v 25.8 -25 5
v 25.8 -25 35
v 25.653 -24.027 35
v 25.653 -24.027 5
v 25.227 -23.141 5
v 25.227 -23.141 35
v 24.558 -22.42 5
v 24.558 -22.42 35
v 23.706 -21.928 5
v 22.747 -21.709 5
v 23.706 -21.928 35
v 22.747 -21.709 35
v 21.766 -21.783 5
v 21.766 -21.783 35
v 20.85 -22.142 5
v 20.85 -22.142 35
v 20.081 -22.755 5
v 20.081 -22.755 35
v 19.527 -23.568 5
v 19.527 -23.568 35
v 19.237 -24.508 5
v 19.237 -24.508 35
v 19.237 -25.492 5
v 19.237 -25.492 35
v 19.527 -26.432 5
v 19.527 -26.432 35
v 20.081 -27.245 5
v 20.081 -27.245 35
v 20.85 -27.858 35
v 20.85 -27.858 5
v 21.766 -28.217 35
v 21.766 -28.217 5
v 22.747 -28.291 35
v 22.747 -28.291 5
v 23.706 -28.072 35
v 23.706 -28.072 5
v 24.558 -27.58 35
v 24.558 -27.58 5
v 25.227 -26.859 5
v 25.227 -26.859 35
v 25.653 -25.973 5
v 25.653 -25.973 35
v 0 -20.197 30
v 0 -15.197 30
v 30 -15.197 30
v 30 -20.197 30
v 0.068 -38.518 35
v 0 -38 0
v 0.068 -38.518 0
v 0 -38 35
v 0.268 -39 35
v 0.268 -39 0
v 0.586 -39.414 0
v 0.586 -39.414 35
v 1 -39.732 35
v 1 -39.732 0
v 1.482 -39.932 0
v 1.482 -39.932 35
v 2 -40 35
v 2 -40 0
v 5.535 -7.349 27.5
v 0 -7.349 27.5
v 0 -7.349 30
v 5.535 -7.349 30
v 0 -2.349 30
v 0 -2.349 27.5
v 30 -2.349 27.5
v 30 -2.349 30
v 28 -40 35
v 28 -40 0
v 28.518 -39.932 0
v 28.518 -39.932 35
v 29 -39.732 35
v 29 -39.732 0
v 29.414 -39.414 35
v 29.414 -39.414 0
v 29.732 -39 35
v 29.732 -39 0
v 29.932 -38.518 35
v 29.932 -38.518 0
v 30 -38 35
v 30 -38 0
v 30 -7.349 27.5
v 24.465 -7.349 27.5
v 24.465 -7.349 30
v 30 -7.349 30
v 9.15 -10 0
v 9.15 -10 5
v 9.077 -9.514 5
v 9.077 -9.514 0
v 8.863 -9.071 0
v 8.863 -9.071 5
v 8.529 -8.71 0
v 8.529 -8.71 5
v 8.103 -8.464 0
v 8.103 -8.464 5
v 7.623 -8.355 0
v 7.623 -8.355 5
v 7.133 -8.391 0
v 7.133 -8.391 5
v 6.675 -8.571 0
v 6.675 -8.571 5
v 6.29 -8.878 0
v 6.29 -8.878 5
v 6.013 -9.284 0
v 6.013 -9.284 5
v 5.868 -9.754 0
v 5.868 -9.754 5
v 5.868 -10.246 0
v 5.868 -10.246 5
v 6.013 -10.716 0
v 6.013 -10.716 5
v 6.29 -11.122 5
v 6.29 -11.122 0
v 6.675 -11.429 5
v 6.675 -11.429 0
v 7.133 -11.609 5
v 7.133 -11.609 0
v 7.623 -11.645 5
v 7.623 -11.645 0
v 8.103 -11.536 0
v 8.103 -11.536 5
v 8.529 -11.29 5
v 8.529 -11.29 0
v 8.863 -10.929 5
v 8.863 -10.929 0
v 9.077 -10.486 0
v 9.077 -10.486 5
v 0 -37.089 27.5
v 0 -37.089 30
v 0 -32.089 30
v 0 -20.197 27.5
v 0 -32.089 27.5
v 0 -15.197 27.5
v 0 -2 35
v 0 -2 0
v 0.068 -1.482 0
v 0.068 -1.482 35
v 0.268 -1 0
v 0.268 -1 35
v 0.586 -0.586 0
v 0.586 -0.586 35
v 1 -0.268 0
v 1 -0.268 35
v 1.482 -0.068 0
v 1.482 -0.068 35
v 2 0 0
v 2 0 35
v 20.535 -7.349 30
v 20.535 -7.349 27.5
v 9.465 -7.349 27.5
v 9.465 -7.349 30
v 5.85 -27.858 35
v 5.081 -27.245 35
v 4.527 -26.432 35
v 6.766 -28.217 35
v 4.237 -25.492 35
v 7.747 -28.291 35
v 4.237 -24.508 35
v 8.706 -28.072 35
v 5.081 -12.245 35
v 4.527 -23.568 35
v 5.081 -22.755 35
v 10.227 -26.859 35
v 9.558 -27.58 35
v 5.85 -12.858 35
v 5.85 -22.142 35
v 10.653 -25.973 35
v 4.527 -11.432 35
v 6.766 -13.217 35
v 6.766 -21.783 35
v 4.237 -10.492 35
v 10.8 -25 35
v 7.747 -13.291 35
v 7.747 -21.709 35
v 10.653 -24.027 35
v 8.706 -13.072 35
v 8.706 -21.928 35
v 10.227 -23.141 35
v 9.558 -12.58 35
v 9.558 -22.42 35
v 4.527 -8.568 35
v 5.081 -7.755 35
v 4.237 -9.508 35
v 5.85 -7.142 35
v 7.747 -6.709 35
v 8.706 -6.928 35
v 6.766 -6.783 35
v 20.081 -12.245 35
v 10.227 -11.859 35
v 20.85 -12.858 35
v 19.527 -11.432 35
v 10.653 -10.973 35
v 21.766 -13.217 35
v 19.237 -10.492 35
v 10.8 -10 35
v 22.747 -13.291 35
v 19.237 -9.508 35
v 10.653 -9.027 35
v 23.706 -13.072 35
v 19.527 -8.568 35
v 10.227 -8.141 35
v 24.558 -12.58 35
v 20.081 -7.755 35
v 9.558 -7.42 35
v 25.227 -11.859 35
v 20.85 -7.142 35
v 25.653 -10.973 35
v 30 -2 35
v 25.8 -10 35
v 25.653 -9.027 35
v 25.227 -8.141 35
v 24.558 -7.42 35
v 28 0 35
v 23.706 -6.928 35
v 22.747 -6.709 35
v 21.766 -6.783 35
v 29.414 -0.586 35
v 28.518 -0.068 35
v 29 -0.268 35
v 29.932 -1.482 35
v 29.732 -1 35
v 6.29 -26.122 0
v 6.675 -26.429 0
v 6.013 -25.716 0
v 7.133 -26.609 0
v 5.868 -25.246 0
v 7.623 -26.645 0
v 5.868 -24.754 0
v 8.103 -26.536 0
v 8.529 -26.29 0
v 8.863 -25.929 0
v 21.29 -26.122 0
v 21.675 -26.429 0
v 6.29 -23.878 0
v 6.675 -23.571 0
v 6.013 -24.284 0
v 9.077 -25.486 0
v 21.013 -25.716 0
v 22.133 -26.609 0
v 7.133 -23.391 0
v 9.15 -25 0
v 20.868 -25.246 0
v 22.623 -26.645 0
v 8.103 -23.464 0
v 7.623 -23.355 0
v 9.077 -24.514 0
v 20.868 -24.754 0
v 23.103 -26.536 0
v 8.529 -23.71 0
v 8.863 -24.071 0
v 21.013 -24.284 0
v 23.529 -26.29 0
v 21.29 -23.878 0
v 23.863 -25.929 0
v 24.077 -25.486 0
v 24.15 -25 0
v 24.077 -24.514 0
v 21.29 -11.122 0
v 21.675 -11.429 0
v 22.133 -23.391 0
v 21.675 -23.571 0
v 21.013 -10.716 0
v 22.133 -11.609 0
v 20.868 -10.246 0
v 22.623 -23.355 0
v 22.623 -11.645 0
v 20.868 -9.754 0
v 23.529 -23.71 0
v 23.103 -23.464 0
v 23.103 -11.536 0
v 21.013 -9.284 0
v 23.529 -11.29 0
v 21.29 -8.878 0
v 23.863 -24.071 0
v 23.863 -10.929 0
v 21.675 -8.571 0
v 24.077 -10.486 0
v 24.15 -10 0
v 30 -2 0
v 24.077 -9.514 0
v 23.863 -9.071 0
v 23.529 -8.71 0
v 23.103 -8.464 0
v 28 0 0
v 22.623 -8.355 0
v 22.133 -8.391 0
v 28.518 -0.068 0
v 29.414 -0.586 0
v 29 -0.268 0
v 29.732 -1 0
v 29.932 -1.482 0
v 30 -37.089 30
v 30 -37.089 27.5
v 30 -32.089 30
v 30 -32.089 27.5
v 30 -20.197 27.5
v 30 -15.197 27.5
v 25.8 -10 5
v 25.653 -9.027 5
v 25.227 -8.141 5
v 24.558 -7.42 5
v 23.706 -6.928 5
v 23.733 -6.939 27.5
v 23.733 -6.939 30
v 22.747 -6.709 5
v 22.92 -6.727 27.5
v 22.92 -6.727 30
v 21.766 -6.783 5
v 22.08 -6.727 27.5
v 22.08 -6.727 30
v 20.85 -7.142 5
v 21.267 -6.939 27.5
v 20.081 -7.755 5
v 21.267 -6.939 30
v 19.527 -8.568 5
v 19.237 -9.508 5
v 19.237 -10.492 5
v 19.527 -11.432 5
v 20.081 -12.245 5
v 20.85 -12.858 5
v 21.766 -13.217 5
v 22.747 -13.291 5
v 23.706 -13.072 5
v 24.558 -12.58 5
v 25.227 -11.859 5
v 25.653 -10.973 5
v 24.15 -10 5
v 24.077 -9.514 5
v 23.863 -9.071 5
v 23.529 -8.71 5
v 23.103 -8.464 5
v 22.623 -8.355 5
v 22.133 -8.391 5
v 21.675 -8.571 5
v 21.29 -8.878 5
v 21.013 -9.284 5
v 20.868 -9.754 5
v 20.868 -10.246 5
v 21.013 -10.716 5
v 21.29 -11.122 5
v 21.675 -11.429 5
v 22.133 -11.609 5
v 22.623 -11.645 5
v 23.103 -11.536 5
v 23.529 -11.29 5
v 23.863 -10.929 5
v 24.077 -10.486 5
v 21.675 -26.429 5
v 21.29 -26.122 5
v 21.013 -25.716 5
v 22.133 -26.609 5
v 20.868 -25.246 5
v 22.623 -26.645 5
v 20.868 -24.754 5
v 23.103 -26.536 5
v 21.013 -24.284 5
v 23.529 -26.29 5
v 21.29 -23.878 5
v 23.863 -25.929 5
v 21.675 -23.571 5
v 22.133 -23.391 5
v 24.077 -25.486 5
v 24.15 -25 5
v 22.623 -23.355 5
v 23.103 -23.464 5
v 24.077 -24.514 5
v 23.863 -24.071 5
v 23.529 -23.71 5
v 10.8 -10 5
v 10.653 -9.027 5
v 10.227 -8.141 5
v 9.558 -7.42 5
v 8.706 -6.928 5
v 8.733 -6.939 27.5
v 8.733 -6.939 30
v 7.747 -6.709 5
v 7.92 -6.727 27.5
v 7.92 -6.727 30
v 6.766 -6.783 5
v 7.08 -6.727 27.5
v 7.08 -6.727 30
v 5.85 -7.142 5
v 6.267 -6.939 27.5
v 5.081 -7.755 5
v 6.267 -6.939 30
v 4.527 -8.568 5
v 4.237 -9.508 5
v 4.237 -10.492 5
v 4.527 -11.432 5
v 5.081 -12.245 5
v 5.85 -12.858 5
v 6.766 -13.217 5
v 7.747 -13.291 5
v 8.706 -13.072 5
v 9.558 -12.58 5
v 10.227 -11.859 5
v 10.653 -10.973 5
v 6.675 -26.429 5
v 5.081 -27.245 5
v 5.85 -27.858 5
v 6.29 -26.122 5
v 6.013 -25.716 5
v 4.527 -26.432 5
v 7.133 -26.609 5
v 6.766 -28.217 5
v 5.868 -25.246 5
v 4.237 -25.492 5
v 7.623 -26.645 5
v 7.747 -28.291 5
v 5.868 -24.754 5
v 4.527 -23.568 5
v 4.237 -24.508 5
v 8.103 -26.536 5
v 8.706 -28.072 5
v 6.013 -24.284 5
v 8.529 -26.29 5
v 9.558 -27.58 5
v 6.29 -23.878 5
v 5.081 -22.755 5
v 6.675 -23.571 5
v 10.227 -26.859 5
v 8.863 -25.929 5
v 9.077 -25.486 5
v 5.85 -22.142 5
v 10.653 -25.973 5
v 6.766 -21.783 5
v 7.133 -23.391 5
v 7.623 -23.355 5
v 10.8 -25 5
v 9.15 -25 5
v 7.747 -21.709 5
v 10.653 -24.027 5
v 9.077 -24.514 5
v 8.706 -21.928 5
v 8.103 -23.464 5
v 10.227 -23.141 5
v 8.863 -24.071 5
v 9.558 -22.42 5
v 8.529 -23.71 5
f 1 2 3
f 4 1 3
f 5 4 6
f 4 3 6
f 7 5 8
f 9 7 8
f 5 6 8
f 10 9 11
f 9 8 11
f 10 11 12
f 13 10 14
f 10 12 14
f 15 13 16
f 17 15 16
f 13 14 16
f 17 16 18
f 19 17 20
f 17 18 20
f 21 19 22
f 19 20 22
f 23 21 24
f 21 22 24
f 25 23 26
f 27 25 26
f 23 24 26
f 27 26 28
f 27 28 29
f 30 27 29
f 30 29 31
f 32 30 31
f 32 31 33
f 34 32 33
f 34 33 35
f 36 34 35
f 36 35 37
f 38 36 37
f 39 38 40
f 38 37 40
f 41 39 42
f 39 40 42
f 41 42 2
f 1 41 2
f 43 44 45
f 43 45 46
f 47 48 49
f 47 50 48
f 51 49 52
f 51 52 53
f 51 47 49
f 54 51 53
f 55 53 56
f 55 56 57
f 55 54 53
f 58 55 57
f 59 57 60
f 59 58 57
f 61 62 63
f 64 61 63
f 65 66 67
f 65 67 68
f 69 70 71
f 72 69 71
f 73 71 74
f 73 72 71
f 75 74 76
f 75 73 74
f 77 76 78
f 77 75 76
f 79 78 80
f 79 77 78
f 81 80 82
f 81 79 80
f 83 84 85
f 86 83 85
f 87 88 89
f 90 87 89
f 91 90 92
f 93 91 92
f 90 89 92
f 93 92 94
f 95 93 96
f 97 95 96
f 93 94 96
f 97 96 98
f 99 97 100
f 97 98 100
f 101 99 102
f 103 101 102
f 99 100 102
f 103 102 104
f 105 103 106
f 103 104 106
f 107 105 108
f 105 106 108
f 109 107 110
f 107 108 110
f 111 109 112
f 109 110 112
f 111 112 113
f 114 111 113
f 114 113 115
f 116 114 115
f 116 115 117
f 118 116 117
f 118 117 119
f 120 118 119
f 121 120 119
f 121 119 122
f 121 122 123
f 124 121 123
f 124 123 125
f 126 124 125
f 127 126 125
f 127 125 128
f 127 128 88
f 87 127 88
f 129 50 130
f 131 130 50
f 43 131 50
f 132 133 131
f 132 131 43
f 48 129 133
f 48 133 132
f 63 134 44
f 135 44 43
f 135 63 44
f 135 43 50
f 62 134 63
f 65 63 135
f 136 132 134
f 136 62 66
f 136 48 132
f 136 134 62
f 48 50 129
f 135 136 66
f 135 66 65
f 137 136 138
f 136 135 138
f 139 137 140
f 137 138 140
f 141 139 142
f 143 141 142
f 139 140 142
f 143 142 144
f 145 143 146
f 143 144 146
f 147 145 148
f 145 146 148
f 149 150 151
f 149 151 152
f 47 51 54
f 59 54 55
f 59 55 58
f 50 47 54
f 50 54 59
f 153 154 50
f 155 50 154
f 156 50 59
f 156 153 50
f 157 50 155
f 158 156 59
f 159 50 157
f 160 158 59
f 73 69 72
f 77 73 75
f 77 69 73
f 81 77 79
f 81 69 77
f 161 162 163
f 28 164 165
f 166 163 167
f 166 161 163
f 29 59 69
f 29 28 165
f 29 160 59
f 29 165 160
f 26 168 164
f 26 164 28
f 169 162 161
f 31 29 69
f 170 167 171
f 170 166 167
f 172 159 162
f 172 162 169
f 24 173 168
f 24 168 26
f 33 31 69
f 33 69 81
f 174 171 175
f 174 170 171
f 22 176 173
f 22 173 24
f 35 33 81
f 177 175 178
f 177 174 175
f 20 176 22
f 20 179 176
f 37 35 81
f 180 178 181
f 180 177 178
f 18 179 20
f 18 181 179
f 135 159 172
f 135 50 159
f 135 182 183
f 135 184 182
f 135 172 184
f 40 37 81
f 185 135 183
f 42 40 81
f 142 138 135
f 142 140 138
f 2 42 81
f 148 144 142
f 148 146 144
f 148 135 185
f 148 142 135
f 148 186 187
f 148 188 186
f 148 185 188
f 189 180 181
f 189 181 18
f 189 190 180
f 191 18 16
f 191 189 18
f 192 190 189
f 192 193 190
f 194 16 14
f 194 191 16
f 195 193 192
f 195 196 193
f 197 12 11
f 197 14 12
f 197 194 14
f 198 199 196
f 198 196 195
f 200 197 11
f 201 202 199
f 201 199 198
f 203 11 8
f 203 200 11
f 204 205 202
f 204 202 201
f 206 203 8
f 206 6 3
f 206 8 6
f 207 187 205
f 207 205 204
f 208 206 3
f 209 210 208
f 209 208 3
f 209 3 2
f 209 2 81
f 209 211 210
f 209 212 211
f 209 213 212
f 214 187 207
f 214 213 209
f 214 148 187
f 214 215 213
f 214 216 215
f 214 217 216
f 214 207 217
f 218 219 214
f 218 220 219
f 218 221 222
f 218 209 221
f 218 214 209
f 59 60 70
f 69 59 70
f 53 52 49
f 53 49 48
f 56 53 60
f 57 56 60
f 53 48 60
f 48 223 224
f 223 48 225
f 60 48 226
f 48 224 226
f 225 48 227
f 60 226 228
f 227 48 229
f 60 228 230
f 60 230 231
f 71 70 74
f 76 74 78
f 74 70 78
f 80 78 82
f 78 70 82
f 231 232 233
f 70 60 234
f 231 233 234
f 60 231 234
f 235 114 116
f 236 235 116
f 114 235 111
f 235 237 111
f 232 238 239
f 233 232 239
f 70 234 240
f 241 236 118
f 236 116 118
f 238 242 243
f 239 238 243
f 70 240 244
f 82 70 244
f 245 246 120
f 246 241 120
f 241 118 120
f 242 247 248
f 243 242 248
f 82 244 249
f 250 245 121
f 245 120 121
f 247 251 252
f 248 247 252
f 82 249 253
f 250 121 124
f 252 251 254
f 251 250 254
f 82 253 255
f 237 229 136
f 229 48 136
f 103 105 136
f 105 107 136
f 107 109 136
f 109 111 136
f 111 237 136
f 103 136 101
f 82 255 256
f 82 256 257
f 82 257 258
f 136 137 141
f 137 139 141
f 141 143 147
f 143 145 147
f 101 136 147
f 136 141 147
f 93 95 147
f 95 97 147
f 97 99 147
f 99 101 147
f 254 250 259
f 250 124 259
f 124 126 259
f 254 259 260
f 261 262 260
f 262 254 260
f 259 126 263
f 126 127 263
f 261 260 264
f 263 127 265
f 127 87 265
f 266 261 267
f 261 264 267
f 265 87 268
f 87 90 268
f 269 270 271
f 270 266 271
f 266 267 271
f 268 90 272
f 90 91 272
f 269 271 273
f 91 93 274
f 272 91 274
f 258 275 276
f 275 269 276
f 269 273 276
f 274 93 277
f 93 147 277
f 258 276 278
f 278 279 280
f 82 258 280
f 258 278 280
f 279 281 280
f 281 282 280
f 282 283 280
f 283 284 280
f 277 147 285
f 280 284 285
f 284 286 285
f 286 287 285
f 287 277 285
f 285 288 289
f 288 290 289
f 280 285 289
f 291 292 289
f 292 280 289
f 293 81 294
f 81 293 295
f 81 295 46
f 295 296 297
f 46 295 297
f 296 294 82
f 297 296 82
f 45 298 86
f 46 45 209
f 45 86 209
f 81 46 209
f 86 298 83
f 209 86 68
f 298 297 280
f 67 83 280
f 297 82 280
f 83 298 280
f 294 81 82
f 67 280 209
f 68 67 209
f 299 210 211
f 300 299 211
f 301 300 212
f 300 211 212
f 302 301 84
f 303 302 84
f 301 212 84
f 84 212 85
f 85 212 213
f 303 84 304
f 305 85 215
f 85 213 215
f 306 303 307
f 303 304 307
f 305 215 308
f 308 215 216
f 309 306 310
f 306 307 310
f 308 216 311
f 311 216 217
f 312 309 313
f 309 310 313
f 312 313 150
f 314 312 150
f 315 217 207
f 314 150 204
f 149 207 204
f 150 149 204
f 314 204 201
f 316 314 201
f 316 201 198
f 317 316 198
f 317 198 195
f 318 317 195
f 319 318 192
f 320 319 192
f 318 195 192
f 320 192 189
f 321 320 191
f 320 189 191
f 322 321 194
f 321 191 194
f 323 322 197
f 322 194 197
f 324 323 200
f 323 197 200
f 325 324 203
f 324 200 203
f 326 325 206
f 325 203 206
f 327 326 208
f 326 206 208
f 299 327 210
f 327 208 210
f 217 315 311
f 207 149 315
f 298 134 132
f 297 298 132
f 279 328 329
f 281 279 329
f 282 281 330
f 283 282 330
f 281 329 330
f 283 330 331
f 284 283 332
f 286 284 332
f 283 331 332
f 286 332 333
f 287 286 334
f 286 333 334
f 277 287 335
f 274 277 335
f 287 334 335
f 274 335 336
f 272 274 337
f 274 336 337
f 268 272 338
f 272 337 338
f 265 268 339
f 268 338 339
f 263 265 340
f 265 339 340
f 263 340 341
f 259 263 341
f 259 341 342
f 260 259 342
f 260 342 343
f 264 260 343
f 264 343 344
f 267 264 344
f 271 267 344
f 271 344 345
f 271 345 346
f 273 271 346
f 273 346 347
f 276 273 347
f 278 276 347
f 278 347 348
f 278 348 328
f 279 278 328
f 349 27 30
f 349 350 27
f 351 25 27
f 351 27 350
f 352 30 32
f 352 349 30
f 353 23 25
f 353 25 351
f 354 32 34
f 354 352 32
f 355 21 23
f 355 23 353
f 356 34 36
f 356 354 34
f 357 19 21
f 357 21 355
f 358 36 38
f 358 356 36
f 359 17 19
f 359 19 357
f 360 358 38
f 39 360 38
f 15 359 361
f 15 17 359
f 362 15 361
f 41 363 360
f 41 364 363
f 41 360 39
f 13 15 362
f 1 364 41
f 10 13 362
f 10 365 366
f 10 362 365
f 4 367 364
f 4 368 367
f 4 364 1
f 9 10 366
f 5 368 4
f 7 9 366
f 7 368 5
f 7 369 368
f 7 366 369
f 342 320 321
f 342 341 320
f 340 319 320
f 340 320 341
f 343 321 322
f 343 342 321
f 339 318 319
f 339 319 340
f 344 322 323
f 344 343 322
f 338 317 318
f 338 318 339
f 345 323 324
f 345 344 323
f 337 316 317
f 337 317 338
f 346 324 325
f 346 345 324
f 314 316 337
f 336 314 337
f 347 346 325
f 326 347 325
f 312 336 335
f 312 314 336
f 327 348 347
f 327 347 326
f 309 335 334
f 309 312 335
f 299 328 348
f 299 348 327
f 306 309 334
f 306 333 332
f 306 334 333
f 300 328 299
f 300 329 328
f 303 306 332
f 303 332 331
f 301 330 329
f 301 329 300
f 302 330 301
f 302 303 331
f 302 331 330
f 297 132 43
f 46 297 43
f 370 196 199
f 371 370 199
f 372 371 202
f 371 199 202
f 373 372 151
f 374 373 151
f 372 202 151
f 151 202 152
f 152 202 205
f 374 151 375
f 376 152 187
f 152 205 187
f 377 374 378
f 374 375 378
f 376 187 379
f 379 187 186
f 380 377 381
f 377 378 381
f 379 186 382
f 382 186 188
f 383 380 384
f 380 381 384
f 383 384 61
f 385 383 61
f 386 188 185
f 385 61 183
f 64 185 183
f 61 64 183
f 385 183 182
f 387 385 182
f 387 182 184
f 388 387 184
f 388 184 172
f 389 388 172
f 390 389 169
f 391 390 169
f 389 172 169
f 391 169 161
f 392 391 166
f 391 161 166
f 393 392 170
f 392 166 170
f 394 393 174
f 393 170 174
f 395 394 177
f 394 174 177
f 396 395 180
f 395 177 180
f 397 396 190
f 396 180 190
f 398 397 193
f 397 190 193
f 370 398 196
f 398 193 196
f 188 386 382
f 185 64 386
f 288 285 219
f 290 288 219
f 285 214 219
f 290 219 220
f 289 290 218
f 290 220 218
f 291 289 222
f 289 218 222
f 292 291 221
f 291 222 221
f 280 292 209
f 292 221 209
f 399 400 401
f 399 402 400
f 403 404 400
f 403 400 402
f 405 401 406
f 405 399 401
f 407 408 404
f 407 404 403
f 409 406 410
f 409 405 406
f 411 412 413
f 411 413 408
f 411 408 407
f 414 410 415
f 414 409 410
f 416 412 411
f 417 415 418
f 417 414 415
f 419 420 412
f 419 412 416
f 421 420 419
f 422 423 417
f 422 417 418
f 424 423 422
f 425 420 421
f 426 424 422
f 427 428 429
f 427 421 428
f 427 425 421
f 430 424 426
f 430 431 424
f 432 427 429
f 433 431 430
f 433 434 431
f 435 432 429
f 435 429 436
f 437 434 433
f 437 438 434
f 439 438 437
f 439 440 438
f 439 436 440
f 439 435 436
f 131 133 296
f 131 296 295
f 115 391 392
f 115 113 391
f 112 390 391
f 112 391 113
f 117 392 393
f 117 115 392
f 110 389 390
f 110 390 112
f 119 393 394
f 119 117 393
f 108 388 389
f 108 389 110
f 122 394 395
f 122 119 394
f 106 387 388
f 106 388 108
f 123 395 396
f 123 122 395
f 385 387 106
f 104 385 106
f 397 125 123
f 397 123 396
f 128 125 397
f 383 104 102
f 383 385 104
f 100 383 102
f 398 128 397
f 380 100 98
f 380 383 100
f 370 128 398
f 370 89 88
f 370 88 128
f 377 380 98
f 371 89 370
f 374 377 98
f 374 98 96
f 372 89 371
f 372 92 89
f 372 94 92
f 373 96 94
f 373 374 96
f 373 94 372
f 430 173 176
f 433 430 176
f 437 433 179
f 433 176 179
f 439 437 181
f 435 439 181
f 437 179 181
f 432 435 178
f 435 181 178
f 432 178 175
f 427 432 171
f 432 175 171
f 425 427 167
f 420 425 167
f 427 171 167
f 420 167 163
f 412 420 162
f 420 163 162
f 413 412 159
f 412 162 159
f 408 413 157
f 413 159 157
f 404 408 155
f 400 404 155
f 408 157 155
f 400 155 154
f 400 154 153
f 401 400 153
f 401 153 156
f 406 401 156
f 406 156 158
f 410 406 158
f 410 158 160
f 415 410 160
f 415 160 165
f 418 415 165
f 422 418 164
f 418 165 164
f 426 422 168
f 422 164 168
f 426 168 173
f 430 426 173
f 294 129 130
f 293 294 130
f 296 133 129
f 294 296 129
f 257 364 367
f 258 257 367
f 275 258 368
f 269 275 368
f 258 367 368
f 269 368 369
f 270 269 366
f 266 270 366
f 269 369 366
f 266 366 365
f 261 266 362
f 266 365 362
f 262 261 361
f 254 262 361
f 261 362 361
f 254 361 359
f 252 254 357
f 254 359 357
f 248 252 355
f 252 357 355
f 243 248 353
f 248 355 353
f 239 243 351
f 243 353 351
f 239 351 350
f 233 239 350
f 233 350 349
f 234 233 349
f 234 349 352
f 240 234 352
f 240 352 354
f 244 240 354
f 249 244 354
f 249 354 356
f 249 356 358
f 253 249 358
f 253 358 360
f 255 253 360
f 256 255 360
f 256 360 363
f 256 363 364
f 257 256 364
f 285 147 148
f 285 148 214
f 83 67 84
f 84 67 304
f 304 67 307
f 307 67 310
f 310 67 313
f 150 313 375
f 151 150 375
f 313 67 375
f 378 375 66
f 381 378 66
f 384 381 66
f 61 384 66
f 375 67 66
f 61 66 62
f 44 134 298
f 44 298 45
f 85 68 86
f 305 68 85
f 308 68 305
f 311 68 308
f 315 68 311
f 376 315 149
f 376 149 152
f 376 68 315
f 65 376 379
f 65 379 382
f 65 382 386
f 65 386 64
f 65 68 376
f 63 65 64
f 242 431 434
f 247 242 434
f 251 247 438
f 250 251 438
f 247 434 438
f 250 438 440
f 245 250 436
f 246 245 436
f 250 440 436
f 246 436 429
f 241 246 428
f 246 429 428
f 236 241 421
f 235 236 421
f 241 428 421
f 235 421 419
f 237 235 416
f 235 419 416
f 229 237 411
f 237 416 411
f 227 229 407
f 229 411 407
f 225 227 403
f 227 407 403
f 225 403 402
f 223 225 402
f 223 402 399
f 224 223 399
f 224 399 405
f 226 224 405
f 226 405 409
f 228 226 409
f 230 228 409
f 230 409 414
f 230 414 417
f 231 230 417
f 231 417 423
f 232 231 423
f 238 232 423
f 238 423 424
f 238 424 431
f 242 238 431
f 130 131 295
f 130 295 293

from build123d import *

# Parameters (mm, degrees)
F0_W      = 30
F0_H      = 40
F1_DEPTH  = 35
F2_R      = 3.3
F3_DEPTH  = 30
F4_W      = 5
F4_H      = 2.5
F5_DEPTH  = 30.001
F6_R      = 1.65
F7_DEPTH  = 5.001
F8_R      = 1.65
F9_DEPTH  = 5.001
F10_R     = 1.65
F11_DEPTH = 5.001
F12_R     = 1.65
F13_DEPTH = 5.001
F14_R     = 2


with BuildPart() as f1:
    # F0 (on Top) → F1 (new body)
    with BuildSketch(Plane.XY):
        with Locations((15, -20)):
            Rectangle(F0_W, F0_H)
    extrude(amount=F1_DEPTH)

    # F2 (on face) → F3 (cut)
    with BuildSketch(Plane.XY.offset(35)):
        with Locations((7.5, -10)):
            Circle(F2_R)
        with Locations((22.5, -10)):
            Circle(F2_R)
        with Locations((7.5, -25)):
            Circle(F2_R)
        with Locations((22.5, -25)):
            Circle(F2_R)
    extrude(amount=-F3_DEPTH, mode=Mode.SUBTRACT)

    # F4 (on face) → F5 (cut, through all)
    with BuildSketch(Plane(origin=(0, 0, 0), x_dir=(0, -1, 0), z_dir=(-1, 0, 0))):
        with Locations((4.849052, 28.75)):
            Rectangle(F4_W, F4_H)
        with Locations((17.696945, 28.75)):
            Rectangle(F4_W, F4_H)
        with Locations((34.58895, 28.75)):
            Rectangle(F4_W, F4_H)
    extrude(amount=-F5_DEPTH, mode=Mode.SUBTRACT)

    # F6 (on face) → F7 (cut, through all)
    with BuildSketch(Plane.XY.offset(5)):
        with Locations((7.5, -10)):
            Circle(F6_R)
    extrude(amount=-F7_DEPTH, mode=Mode.SUBTRACT)

    # F8 (on face) → F9 (cut, through all)
    with BuildSketch(Plane.XY.offset(5)):
        with Locations((7.5, -25)):
            Circle(F8_R)
    extrude(amount=-F9_DEPTH, mode=Mode.SUBTRACT)

    # F10 (on face) → F11 (cut, through all)
    with BuildSketch(Plane.XY.offset(5)):
        with Locations((22.5, -25)):
            Circle(F10_R)
    extrude(amount=-F11_DEPTH, mode=Mode.SUBTRACT)

    # F12 (on face) → F13 (cut, through all)
    with BuildSketch(Plane.XY.offset(5)):
        with Locations((22.5, -10)):
            Circle(F12_R)
    extrude(amount=-F13_DEPTH, mode=Mode.SUBTRACT)

    # F14
    f14_edges = [f1.edges().sort_by_distance(p)[0] for p in [
        (0, 0, 17.5),
        (30, 0, 17.5),
        (30, -40, 17.5),
        (0, -40, 17.5),
    ]]
    fillet(f14_edges, radius=F14_R)


solid = f1.part
